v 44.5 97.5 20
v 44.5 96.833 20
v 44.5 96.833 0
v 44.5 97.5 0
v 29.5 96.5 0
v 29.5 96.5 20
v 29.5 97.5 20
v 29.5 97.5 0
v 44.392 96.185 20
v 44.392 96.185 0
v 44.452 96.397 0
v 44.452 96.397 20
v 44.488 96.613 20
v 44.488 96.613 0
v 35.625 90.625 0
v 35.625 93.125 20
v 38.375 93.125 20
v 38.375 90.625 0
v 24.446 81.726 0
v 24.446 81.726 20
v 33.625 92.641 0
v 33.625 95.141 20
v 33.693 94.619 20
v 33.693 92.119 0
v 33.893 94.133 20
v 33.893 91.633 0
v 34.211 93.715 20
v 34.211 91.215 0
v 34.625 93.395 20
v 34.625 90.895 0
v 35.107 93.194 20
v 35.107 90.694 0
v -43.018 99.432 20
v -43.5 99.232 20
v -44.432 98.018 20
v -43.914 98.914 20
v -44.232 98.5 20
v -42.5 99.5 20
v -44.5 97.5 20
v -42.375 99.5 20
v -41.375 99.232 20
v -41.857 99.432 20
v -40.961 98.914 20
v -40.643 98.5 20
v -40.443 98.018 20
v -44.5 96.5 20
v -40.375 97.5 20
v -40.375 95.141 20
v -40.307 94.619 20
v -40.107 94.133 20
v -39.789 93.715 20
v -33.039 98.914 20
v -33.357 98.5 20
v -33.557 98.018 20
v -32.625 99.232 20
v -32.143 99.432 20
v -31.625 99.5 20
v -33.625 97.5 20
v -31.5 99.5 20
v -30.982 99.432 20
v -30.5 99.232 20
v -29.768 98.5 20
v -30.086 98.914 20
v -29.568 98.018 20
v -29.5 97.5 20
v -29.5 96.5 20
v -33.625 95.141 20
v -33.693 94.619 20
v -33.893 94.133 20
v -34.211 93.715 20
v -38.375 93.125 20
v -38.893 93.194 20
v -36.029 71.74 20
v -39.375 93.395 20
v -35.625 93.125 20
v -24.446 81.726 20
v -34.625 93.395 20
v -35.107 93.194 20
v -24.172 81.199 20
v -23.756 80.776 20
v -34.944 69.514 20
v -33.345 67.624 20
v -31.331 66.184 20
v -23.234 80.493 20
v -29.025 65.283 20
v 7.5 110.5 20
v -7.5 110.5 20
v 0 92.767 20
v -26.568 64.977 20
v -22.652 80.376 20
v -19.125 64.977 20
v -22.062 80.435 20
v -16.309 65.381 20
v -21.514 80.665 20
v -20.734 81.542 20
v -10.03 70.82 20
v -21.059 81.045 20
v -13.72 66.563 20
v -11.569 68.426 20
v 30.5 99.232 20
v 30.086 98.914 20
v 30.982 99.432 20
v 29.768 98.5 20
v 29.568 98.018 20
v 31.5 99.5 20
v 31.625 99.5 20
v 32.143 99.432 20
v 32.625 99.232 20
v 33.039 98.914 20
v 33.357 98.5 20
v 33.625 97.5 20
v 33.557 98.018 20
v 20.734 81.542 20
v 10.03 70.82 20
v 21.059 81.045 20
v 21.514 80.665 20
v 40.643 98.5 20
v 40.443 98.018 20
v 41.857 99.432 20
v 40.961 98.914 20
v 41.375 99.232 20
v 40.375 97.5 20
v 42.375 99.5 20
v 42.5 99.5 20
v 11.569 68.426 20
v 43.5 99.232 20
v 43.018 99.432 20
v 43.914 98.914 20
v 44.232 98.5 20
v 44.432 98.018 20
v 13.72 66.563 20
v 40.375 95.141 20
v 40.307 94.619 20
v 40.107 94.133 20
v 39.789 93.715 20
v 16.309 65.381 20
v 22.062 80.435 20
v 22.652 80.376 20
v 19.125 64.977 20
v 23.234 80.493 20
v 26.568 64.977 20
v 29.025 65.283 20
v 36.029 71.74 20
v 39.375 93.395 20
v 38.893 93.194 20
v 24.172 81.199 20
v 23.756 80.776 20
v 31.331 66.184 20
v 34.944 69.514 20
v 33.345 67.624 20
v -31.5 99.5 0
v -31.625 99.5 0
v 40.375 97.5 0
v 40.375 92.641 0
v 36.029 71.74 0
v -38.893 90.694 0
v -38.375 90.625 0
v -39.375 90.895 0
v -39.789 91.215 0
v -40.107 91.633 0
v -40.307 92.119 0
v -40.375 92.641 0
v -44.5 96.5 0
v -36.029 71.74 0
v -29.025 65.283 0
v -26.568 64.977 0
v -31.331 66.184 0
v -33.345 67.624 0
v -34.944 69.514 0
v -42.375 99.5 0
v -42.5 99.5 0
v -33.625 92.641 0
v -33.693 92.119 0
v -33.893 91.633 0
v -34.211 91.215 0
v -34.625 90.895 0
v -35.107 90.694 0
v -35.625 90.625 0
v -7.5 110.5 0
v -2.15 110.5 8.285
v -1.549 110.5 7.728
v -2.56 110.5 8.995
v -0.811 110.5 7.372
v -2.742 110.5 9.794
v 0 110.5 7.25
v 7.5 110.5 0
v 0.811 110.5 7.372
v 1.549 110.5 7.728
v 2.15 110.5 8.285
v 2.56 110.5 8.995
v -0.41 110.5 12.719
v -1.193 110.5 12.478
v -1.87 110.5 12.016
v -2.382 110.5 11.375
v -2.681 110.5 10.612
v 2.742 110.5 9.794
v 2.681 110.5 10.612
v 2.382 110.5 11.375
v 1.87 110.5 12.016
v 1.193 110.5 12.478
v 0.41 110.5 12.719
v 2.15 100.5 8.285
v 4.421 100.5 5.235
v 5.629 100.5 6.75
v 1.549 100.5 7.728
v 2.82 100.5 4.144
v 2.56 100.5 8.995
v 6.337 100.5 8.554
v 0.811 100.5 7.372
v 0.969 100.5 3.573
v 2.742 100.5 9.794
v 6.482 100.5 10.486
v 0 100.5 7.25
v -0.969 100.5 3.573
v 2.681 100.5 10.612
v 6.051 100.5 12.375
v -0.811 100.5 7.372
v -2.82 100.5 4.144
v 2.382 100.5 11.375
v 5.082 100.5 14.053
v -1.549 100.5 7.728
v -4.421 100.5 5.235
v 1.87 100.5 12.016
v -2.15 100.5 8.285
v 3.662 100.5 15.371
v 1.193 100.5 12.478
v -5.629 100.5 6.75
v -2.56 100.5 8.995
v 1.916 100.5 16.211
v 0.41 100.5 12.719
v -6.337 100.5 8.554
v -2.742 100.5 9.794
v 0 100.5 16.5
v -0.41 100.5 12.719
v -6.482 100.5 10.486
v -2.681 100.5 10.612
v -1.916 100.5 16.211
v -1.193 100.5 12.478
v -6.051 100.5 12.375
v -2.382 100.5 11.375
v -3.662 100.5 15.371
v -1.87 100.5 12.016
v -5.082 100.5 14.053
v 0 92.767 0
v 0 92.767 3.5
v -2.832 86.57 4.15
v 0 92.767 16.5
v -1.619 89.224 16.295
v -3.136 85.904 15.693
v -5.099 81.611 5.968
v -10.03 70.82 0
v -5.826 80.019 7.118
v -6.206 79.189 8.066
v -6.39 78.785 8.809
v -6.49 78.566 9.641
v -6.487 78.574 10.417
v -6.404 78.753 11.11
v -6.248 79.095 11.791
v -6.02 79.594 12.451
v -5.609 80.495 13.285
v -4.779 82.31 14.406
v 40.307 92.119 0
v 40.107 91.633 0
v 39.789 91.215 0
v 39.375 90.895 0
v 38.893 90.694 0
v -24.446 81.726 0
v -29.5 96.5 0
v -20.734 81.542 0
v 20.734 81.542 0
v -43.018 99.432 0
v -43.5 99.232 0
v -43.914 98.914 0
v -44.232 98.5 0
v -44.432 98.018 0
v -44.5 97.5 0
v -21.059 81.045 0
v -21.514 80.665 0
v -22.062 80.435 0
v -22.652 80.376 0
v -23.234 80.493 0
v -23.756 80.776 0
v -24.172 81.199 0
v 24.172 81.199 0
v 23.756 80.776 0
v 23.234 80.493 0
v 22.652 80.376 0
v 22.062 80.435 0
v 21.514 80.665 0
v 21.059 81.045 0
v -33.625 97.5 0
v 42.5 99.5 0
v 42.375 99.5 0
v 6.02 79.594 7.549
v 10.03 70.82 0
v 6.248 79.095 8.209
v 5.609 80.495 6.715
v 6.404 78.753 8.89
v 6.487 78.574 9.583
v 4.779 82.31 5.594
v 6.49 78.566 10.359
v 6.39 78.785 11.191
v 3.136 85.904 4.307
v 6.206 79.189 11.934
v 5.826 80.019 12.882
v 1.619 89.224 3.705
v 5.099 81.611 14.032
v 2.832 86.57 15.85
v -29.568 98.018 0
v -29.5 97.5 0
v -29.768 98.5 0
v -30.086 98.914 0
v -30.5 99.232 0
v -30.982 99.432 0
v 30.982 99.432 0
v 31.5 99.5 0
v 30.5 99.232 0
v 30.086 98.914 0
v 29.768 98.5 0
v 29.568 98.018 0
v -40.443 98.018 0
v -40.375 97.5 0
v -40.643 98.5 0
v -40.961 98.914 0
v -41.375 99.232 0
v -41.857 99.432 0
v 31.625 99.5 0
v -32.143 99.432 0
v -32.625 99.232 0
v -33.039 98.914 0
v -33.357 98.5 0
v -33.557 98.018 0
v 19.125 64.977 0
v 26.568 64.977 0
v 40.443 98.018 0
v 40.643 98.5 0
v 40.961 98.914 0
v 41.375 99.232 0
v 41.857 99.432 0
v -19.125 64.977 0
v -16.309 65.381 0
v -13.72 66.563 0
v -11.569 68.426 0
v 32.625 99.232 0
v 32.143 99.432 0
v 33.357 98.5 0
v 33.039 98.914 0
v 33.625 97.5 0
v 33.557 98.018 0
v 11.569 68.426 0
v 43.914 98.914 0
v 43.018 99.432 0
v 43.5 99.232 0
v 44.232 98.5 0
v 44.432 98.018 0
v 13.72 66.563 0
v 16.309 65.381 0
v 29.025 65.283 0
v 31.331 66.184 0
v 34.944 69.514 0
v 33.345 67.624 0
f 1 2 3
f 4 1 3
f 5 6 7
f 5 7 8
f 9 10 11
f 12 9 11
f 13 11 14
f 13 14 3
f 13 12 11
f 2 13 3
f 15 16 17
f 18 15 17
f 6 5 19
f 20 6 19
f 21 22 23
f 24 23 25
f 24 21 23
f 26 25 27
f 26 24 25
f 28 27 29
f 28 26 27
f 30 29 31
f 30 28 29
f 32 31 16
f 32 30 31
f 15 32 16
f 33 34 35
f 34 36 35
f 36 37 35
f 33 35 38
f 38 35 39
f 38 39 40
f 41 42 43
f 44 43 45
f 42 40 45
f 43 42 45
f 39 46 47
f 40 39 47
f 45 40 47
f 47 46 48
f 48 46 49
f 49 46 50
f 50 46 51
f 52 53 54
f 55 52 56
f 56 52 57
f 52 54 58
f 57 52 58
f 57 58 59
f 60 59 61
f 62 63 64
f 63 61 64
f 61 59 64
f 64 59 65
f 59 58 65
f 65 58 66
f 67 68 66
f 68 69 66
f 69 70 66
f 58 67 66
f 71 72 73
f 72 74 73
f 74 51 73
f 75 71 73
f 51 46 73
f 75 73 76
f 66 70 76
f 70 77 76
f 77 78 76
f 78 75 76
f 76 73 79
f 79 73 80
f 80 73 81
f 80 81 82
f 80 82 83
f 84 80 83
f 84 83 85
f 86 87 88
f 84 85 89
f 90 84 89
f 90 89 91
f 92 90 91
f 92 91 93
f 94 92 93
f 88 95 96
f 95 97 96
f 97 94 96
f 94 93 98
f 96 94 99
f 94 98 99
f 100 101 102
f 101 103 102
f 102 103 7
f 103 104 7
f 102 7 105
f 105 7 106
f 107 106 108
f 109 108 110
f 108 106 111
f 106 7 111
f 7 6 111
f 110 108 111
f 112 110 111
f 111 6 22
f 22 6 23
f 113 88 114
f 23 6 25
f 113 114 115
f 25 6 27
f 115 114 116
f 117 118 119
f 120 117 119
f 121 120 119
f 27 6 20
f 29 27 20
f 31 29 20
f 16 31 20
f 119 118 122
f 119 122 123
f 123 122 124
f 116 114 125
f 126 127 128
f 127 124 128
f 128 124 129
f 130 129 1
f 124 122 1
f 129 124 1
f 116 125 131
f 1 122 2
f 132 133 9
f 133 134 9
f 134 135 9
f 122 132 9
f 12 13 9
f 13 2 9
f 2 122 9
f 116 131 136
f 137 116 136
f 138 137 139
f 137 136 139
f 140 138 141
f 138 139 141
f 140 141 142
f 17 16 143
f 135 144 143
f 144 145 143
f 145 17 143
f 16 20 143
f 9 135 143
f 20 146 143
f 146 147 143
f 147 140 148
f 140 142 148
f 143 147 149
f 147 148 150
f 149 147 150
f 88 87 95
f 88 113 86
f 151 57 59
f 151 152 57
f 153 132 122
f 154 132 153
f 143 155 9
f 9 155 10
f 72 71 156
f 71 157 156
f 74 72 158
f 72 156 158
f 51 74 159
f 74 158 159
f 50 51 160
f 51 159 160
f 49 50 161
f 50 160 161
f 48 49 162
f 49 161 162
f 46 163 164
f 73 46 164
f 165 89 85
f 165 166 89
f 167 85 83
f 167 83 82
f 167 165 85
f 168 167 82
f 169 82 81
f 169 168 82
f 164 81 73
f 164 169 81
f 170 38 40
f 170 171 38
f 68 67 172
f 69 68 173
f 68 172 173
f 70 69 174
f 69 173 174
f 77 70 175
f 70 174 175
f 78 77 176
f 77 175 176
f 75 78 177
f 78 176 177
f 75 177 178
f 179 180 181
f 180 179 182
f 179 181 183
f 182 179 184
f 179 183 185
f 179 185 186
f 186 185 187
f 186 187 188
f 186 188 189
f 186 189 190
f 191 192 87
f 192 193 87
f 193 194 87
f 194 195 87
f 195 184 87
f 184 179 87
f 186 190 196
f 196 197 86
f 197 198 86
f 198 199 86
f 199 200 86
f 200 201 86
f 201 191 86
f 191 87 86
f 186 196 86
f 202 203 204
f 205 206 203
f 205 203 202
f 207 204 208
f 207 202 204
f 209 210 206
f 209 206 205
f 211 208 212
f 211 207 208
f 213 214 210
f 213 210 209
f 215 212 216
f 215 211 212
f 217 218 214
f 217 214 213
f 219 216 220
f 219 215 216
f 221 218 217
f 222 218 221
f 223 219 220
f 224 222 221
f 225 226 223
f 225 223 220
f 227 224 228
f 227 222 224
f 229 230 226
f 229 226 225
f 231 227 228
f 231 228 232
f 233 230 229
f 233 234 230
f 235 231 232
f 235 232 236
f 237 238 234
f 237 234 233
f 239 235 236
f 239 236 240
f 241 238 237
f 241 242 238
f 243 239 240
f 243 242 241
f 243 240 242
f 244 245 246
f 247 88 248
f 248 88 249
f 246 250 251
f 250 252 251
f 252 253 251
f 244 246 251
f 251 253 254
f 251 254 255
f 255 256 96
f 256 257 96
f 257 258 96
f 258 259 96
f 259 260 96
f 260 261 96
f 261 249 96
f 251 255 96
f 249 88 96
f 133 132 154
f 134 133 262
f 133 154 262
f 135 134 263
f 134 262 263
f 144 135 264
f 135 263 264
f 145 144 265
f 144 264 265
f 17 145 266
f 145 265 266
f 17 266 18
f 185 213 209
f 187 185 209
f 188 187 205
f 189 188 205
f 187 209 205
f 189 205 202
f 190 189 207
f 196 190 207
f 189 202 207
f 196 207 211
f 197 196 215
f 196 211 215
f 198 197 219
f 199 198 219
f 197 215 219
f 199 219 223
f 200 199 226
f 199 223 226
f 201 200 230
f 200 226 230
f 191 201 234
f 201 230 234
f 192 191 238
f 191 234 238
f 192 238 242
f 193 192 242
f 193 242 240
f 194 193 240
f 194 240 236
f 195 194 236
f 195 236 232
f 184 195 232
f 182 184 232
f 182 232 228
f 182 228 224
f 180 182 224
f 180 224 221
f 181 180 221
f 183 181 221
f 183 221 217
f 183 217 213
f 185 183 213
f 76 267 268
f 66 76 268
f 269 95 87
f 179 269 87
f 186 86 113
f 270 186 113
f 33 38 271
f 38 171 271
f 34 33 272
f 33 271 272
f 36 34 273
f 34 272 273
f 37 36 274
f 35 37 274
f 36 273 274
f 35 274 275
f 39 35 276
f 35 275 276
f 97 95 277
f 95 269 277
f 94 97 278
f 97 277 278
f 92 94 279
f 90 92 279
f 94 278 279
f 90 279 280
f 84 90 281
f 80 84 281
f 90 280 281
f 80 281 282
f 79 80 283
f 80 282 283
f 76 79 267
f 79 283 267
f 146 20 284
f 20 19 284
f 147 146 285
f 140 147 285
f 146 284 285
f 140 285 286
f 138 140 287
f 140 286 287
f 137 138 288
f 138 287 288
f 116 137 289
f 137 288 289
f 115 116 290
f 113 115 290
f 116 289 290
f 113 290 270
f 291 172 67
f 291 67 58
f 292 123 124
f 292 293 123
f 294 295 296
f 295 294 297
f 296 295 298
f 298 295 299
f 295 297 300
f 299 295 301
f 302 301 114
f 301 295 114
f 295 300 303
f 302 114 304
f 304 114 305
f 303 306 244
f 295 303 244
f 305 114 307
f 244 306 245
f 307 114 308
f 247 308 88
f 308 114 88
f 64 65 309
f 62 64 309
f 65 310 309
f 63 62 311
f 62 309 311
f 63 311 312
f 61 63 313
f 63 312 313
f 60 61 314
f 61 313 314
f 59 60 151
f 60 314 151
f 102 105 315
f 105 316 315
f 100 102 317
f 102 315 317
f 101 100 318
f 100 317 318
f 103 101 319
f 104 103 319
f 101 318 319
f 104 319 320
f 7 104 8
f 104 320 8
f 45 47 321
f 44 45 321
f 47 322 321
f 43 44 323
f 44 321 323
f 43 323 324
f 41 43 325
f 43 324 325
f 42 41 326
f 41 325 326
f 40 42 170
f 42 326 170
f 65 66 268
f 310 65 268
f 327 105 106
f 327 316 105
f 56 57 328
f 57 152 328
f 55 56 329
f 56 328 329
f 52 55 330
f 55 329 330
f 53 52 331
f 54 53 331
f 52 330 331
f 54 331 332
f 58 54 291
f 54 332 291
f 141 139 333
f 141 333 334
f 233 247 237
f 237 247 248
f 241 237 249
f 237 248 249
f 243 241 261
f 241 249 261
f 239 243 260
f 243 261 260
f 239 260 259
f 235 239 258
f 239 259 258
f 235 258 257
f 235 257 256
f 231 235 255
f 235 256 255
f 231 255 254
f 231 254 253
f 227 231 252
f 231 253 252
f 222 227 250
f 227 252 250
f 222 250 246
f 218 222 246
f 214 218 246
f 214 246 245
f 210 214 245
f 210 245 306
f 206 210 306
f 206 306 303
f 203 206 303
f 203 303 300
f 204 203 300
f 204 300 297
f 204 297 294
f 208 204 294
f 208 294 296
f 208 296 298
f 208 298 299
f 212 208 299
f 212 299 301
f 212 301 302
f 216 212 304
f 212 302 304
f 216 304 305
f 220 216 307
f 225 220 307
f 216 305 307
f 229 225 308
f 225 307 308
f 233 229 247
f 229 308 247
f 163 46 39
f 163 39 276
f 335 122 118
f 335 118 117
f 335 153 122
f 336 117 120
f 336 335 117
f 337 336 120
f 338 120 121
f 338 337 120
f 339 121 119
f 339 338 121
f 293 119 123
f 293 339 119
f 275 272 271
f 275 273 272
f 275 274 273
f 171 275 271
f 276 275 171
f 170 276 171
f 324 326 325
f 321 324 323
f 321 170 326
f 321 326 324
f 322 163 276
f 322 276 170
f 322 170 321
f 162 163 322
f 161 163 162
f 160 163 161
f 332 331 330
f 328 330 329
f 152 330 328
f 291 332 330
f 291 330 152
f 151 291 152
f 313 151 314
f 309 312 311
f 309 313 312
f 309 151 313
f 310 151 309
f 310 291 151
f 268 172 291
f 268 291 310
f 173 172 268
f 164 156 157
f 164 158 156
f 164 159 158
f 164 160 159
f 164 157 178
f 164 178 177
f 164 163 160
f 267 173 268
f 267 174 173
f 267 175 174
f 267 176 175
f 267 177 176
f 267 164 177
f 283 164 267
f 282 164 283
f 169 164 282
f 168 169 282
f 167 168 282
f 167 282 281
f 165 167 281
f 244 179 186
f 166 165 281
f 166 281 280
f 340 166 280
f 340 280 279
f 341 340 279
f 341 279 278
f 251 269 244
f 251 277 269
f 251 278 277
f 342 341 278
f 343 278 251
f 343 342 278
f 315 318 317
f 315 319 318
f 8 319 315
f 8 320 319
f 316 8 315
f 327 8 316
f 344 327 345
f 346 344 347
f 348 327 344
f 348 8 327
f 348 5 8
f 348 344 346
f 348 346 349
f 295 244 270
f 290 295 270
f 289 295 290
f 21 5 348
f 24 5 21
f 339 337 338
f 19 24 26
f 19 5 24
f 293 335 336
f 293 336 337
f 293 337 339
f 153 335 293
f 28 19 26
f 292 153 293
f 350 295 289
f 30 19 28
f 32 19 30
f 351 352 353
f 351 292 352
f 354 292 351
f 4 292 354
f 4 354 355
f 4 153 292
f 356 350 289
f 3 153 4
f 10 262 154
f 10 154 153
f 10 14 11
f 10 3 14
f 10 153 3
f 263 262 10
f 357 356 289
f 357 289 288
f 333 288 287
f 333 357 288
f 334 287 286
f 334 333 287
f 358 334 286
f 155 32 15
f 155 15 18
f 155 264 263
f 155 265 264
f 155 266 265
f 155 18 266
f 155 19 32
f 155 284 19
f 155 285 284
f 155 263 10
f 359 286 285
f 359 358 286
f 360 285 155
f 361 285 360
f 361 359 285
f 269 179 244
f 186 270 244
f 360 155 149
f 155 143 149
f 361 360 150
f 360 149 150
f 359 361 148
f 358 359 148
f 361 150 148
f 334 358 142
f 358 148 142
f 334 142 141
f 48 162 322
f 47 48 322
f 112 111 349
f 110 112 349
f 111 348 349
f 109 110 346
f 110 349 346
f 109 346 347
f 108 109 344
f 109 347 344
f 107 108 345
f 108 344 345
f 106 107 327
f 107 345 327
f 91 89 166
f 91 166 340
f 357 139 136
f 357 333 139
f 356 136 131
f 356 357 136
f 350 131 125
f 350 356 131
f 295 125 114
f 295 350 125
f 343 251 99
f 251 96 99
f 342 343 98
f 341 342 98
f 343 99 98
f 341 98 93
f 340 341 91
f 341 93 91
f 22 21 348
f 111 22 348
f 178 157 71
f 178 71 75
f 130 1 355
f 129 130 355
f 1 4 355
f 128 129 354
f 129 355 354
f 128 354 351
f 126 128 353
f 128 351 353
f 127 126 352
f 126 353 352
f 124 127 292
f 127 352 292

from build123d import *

# Parameters (mm, degrees)
SKETCH1_R           = 4
BOSS_EXTRUDE1_DEPTH = 20
FILLET1_R           = 10
SKETCH2_W           = 6.75
SKETCH2_H           = 6.75
CUT_EXTRUDE1_DEPTH  = 122.829645635
SKETCH3_W           = 4.125
SKETCH3_H           = 20
BOSS_EXTRUDE2_DEPTH = 3
FILLET2_R           = 2
BOSS_EXTRUDE3_DEPTH = 20
SKETCH6_W           = 140
SKETCH6_H           = 64.976574758
CUT_EXTRUDE3_DEPTH  = 133.326301241
SKETCH7_R           = 6.5
CUT_EXTRUDE4_DEPTH  = 35.523425242
FILLET5_R           = 2
FILLET6_R           = 10
SKETCH8_R           = 2.75
CUT_EXTRUDE5_DEPTH  = 61.35034168


with BuildPart() as part:
    # Sketch1 → Boss-Extrude1 (new body)
    with BuildSketch(Plane.XY):
        with BuildLine():
            Line((-70, 0), (70, 0))
            Line((70, 0), (70, 12))
            ThreePointArc((70, 12), (66.338834765, 20.838834765), (57.5, 24.5))
            Line((57.5, 24.5), (25, 24.5))
            Line((25, 24.5), (25, 39.5))
            Line((25, 39.5), (44.5, 96.5))
            Line((44.5, 96.5), (29.5, 96.5))
            Line((29.5, 96.5), (0, 10.269230769))
            Line((0, 10.269230769), (-29.5, 96.5))
            Line((-29.5, 96.5), (-44.5, 96.5))
            Line((-44.5, 96.5), (-25, 39.5))
            Line((-25, 39.5), (-25, 24.5))
            Line((-25, 24.5), (-57.5, 24.5))
            ThreePointArc((-57.5, 24.5), (-66.338834765, 20.838834765), (-70, 12))
            Line((-70, 12), (-70, 0))
        make_face()
        with Locations((-57.5, 12)):
            Circle(SKETCH1_R, mode=Mode.SUBTRACT)
        with Locations(Location((57.5, 12, 0), (0, 0, 180))):
            Circle(SKETCH1_R, mode=Mode.SUBTRACT)
    extrude(amount=BOSS_EXTRUDE1_DEPTH)

    # Fillet1
    fillet1_edges = [part.edges().sort_by_distance(p)[0] for p in [
        (25, 39.5, 10),
        (25, 24.5, 10),
        (-25, 24.5, 10),
        (-25, 39.5, 10),
        (0, 10.269230769, 10),
    ]]
    fillet(fillet1_edges, radius=FILLET1_R)

    # Sketch2 → Cut-Extrude1 (cut, through all, along a direction that is not the sketch's normal)
    with BuildSketch(Plane.XY.offset(20)):
        with Locations((37, 96.5)):
            Rectangle(SKETCH2_W, SKETCH2_H)
        with Locations((-37, 96.5)):
            Rectangle(SKETCH2_W, SKETCH2_H)
    extrude(amount=-CUT_EXTRUDE1_DEPTH, dir=(0, 0.12403473458920856, 0.9922778767136676), mode=Mode.SUBTRACT)

    # Sketch3 → Boss-Extrude2 (add)
    with BuildSketch(Plane(origin=(0, 96.5, 0), x_dir=(1, 0, 0), z_dir=(0, 1, 0))):
        with Locations((42.4375, -10)):
            Rectangle(SKETCH3_W, SKETCH3_H)
        with Locations((31.5625, -10)):
            Rectangle(SKETCH3_W, SKETCH3_H)
        with Locations((-31.5625, -10)):
            Rectangle(SKETCH3_W, SKETCH3_H)
        with Locations((-42.4375, -10)):
            Rectangle(SKETCH3_W, SKETCH3_H)
    extrude(amount=BOSS_EXTRUDE2_DEPTH)

    # Fillet2
    fillet2_edges = [part.edges().sort_by_distance(p)[0] for p in [
        (40.375, 91.875, 10),
        (33.625, 91.875, 10),
        (44.5, 99.5, 10),
        (40.375, 99.5, 10),
        (29.5, 99.5, 10),
        (33.625, 99.5, 10),
        (-29.5, 99.5, 10),
        (-33.625, 99.5, 10),
        (-44.5, 99.5, 10),
        (-40.375, 99.5, 10),
        (44.5, 96.5, 10),
        (-33.625, 91.875, 10),
        (-40.375, 91.875, 10),
    ]]
    fillet(fillet2_edges, radius=FILLET2_R)

    # Sketch4 → Boss-Extrude3 (add)
    with BuildSketch(Plane.XY.offset(20)):
        Polygon((-22.82093347, 76.976574758), (-7.5, 110.5), (7.5, 110.5), (22.82093347, 76.976574758), (16.14070638, 57.44975711), (0, 92.766910908), (-16.14070638, 57.44975711), align=None)
    extrude(amount=-BOSS_EXTRUDE3_DEPTH)

    # Sketch6 → Cut-Extrude3 (cut, through all)
    with BuildSketch(Plane.XY.offset(20)):
        with Locations((0, 32.488287379)):
            Rectangle(SKETCH6_W, SKETCH6_H)
    extrude(amount=-CUT_EXTRUDE3_DEPTH, mode=Mode.SUBTRACT)

    # Sketch7 → Cut-Extrude4 (cut)
    with BuildSketch(Plane.XZ.offset(-64.976574758)):
        with Locations(Location((0, 10, 0), (0, 0, 90))):
            Circle(SKETCH7_R)
    extrude(amount=-CUT_EXTRUDE4_DEPTH, mode=Mode.SUBTRACT)

    # Fillet5
    fillet5_edges = [part.edges().sort_by_distance(p)[0] for p in [
        (22.82093347, 76.976574758, 10),
        (-22.82093347, 76.976574758, 10),
    ]]
    fillet(fillet5_edges, radius=FILLET5_R)

    # Fillet6
    fillet6_edges = [part.edges().sort_by_distance(p)[0] for p in [
        (12.700787231, 64.976574758, 10),
        (-33.715670312, 64.976574758, 10),
        (33.715670312, 64.976574758, 10),
        (-12.700787231, 64.976574758, 10),
    ]]
    fillet(fillet6_edges, radius=FILLET6_R)

    # Sketch8 → Cut-Extrude5 (cut, through all)
    with BuildSketch(Plane.XZ.offset(-100.5)):
        with Locations(Location((0, 10, 0), (0, 0, 270))):
            Circle(SKETCH8_R)
    extrude(amount=-CUT_EXTRUDE5_DEPTH, mode=Mode.SUBTRACT)


solid = part.part
